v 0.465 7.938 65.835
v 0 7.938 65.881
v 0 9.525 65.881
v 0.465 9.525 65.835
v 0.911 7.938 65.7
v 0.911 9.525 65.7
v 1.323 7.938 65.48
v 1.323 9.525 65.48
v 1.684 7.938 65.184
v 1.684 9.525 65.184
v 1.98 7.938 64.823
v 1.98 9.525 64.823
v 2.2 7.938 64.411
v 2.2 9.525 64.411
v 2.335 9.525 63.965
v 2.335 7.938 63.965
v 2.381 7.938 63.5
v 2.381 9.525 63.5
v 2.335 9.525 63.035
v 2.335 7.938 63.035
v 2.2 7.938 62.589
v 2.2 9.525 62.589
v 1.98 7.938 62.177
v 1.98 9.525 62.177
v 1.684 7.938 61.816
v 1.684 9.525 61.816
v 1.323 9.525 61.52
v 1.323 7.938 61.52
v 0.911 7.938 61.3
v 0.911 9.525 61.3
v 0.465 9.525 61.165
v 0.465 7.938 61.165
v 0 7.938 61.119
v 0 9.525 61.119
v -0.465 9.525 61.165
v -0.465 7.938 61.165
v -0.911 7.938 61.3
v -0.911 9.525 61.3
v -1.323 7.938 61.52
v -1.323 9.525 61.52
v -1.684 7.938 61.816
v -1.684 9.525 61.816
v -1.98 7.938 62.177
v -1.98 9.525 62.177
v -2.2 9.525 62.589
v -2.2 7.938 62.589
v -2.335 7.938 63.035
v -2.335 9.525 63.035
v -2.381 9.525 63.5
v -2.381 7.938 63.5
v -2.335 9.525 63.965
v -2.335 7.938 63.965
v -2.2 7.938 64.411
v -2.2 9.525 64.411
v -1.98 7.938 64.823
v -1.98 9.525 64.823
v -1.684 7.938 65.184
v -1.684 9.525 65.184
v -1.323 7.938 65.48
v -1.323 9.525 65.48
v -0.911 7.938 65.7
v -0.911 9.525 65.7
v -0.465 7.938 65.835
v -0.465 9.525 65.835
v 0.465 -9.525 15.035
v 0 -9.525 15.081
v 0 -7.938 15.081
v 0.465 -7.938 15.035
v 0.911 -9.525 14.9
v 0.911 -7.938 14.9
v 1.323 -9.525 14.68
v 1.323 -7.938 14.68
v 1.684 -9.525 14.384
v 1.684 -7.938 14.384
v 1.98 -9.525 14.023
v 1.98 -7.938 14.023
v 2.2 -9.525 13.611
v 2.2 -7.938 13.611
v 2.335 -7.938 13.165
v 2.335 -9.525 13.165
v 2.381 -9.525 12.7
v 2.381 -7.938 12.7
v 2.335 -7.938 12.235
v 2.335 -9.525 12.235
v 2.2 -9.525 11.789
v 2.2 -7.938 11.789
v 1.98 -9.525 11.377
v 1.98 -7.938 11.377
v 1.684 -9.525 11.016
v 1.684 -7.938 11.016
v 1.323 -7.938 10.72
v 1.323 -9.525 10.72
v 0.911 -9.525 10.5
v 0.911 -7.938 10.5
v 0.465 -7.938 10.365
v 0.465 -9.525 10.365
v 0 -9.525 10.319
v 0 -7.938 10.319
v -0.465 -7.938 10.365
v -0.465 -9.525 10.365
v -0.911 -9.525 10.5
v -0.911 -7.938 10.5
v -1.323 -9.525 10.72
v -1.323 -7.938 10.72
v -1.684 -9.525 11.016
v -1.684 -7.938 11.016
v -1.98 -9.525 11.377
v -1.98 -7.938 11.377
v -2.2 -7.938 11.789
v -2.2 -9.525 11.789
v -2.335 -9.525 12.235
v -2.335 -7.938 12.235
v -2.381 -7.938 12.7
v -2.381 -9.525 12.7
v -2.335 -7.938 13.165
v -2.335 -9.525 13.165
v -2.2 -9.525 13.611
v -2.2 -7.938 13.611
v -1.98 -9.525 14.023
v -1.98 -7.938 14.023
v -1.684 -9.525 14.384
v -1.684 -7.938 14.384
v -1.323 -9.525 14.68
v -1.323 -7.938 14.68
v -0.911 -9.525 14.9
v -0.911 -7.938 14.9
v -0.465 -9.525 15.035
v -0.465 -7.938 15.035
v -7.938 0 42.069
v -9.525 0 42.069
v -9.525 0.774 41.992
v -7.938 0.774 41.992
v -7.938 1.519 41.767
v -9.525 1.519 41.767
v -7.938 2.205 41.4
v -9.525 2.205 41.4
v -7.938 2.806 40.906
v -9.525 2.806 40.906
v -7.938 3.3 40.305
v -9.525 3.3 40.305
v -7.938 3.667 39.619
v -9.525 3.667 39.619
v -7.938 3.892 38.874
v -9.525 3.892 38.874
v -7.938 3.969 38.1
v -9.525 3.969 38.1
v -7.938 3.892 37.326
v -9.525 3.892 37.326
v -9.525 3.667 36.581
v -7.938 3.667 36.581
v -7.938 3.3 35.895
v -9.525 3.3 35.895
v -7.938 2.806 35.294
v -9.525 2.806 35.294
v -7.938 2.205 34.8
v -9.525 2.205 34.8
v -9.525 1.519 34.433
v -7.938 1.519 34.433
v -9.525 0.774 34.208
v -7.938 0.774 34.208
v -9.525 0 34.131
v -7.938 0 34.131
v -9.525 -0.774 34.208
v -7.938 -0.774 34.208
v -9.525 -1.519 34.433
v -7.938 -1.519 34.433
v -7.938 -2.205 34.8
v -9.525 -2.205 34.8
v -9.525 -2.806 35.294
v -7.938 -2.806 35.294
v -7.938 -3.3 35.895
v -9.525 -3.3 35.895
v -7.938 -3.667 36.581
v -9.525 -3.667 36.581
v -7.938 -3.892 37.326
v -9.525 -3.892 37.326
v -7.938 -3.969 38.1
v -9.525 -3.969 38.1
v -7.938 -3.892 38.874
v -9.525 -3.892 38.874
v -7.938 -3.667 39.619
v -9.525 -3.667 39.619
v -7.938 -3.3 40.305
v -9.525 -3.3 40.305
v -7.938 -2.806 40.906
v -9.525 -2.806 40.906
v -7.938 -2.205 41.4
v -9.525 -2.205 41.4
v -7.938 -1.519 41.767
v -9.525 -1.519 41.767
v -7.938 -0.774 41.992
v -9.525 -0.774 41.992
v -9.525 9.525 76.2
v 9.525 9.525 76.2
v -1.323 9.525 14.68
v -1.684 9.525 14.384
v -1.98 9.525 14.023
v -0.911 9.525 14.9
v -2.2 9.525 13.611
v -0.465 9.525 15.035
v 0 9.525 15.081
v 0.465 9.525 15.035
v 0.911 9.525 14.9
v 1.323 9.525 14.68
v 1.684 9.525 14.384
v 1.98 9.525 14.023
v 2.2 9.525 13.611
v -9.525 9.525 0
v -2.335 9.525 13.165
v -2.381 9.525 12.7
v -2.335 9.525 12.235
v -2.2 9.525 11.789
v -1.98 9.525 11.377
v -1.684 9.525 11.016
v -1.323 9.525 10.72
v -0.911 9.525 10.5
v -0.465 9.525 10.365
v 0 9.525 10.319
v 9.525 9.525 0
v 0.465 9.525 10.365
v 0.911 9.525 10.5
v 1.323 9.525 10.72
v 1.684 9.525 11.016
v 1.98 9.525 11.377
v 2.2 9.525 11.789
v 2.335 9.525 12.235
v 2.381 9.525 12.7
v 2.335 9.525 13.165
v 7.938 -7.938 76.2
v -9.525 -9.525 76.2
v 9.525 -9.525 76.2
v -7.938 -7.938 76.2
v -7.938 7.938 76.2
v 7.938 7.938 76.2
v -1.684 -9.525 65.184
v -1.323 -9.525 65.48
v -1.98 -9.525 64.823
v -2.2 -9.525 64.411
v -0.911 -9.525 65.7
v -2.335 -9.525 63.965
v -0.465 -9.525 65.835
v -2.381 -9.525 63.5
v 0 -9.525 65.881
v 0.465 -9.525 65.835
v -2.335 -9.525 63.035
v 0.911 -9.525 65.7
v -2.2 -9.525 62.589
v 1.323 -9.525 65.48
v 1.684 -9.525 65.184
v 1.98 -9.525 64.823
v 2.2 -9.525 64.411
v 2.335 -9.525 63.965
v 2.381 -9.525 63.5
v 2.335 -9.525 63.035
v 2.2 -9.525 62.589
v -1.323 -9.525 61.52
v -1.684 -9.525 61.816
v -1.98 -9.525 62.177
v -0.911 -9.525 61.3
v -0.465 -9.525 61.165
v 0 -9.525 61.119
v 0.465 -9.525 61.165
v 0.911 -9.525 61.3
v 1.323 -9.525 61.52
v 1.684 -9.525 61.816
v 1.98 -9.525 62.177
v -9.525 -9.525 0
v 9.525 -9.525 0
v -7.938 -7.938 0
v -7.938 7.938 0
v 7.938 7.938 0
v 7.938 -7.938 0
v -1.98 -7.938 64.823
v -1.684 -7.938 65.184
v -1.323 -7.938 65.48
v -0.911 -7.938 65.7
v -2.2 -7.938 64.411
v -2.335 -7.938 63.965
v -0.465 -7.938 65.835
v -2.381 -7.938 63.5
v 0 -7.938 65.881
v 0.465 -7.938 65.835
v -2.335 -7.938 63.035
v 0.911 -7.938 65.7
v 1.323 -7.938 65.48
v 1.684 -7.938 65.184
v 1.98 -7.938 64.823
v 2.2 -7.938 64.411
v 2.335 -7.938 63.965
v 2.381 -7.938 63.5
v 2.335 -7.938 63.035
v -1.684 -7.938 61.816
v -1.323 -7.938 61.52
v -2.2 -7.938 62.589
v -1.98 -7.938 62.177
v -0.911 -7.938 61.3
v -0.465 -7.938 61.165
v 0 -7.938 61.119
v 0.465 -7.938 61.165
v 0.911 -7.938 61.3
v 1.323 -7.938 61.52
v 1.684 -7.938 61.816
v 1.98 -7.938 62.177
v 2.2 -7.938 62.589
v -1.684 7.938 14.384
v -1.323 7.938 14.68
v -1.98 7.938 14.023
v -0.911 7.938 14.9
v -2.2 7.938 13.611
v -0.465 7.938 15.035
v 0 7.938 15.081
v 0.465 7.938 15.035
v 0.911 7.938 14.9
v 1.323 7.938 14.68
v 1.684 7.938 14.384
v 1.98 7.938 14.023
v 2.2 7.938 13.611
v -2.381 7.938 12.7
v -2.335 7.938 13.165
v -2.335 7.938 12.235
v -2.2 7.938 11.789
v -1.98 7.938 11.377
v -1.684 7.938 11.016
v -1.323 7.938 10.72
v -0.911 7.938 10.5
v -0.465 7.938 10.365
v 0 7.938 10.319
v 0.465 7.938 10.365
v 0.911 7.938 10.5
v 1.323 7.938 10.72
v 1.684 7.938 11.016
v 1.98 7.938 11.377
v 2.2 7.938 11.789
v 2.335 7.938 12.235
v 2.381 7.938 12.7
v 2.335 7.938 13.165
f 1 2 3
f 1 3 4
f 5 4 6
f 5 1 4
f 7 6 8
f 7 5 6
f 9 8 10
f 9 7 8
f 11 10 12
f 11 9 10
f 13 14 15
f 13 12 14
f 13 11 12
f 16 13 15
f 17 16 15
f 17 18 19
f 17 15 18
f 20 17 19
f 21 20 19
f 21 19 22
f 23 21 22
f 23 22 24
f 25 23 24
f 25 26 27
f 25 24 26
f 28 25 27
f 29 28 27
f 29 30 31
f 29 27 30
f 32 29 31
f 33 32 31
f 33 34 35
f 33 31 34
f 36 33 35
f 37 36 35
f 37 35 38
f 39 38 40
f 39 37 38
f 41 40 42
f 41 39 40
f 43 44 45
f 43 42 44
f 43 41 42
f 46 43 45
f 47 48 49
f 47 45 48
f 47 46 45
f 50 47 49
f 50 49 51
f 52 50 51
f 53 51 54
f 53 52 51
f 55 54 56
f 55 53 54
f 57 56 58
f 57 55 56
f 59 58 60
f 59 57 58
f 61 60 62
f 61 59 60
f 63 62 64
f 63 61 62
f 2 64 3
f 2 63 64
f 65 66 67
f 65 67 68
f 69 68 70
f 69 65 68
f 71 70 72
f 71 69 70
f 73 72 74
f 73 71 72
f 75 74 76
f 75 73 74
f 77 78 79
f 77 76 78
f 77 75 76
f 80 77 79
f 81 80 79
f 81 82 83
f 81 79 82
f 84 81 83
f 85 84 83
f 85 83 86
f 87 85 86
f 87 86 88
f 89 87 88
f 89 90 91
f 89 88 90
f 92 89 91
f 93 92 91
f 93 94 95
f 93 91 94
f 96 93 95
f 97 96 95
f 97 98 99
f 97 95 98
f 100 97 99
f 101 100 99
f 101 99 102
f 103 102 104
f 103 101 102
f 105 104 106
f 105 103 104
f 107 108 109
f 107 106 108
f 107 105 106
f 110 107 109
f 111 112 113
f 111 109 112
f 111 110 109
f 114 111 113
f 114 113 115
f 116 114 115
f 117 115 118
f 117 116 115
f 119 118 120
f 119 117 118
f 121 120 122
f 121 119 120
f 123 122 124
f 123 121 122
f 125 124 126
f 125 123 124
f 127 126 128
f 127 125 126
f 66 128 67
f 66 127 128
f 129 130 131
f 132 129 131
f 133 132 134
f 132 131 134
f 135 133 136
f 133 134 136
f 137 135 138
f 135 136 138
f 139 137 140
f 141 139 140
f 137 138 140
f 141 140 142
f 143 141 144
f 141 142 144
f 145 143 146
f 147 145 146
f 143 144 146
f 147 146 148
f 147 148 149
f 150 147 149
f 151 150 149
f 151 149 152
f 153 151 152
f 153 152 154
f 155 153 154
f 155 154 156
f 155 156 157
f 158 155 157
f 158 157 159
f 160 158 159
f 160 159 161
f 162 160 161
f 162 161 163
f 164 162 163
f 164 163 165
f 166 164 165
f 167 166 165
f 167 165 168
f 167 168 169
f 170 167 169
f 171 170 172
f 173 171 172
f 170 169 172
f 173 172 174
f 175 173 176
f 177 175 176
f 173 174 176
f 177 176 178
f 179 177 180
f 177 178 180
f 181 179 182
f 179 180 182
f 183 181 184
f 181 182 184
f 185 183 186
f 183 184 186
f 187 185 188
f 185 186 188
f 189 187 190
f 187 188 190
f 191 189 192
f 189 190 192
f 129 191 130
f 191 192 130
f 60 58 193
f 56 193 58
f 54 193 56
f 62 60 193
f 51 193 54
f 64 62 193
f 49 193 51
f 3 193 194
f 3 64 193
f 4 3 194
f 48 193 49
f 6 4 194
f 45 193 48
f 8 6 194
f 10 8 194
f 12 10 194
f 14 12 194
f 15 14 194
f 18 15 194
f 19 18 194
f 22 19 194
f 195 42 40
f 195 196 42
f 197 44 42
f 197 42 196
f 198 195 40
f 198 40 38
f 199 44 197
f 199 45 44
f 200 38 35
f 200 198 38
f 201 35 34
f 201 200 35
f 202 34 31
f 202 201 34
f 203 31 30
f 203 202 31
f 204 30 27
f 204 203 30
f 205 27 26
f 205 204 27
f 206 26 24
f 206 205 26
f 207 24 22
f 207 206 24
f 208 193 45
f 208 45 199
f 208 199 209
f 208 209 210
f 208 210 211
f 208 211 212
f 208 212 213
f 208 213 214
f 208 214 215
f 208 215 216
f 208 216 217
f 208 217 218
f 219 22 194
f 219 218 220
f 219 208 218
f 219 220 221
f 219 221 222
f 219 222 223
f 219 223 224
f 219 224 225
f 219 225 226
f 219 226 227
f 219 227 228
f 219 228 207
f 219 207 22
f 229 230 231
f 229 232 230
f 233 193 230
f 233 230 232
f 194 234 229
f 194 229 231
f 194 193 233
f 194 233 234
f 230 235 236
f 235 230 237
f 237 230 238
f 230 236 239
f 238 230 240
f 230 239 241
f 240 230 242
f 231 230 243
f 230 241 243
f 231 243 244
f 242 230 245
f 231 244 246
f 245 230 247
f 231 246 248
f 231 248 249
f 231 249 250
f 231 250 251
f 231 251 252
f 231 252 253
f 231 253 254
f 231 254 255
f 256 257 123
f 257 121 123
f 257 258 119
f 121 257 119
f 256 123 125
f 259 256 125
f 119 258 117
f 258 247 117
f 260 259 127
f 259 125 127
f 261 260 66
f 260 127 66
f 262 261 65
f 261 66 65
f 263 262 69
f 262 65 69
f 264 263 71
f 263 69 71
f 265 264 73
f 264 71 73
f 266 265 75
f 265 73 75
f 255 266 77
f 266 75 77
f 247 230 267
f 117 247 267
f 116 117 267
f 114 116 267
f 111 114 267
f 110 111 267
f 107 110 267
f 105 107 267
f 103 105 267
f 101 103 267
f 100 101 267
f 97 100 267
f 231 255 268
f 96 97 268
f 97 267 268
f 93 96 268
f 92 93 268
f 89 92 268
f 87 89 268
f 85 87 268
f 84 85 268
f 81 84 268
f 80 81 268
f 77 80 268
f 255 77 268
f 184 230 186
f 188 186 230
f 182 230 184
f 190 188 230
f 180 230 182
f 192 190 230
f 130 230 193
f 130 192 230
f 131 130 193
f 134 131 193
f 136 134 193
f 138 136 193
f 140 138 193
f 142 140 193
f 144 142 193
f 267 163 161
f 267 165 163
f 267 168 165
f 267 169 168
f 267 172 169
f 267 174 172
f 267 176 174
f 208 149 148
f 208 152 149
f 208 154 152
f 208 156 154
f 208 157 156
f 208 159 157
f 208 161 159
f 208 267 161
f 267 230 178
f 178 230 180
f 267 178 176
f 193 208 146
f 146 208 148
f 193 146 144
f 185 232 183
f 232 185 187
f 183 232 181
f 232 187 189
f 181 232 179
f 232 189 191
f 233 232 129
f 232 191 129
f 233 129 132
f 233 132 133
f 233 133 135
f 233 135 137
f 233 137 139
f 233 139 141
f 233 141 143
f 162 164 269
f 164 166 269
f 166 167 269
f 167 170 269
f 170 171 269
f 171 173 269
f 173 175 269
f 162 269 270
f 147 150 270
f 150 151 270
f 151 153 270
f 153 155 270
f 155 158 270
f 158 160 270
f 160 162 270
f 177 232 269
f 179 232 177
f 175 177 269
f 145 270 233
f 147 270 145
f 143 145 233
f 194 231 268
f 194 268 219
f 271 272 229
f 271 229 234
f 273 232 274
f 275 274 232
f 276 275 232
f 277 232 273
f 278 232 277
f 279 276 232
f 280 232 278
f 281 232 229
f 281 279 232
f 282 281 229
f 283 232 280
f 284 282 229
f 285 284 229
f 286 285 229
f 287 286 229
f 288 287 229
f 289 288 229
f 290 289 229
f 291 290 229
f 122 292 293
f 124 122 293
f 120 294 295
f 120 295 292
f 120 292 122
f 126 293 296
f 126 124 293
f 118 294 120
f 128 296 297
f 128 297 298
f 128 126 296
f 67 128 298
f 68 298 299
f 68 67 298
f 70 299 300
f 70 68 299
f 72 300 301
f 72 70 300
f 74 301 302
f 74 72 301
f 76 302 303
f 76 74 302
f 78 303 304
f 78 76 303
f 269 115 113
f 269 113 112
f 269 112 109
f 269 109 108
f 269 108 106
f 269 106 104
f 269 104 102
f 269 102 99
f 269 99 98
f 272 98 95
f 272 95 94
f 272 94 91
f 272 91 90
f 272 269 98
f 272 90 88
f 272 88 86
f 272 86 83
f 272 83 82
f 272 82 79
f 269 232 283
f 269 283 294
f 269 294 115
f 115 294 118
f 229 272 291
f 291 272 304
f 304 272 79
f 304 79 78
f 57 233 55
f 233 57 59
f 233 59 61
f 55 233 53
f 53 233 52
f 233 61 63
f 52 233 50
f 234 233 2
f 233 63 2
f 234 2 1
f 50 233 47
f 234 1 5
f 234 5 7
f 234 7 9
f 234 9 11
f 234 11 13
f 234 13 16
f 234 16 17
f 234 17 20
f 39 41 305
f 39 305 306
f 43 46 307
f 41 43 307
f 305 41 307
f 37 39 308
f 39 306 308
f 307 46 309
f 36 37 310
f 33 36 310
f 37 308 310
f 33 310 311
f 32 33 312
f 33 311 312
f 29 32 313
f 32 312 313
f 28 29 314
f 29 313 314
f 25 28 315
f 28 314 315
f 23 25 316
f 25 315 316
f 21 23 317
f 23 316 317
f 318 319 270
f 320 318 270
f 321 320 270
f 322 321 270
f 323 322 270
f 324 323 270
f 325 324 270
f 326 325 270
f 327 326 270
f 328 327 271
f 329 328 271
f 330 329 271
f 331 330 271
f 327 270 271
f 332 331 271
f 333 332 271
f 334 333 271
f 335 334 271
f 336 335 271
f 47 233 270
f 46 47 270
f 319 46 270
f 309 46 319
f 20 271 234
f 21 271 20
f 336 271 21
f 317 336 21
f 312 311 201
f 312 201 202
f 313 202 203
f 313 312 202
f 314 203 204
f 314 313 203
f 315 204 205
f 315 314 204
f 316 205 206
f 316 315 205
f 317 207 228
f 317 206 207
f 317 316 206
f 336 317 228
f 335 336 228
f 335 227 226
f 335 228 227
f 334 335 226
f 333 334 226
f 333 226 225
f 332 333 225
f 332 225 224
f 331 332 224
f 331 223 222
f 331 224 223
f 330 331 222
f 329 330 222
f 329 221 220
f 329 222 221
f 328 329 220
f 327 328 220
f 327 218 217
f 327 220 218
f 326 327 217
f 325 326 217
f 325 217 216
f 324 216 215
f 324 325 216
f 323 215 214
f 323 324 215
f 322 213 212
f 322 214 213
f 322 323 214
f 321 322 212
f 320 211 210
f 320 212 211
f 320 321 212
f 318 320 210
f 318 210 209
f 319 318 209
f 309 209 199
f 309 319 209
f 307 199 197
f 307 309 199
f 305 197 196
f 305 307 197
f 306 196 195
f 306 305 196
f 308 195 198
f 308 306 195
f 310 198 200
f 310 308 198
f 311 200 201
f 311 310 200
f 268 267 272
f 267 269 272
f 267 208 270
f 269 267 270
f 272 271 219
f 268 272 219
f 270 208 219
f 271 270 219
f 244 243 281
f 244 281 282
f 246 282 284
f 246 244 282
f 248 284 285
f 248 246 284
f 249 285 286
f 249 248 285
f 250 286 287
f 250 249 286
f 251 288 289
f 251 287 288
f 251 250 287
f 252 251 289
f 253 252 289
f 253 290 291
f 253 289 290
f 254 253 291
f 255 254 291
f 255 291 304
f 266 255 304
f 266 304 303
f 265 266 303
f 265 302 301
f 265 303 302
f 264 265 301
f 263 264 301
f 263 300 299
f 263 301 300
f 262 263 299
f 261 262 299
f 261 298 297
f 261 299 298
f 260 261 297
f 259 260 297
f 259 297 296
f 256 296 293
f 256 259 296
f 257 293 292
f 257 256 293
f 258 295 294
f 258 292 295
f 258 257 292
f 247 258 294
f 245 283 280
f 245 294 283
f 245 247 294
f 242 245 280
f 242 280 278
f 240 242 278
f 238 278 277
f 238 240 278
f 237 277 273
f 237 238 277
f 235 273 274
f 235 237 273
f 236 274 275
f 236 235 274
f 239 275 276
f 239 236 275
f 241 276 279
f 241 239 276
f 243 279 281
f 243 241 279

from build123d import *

# Parameters (mm, degrees)
SKETCH1_W               = 19.05
SKETCH1_H               = 19.05
SKETCH1_W_2             = 15.875
SKETCH1_H_2             = 15.875
BOSS_EXTRUDE1_DEPTH     = 76.2
CUT_EXTRUDE1_DEPTH      = 78.381465804
CUT_EXTRUDE1_DEPTH_BACK = 78.381465804
SKETCH2_R               = 2.38125
CUT_EXTRUDE2_REACH      = 81.121
SKETCH3_R               = 3.96875


with BuildPart() as part:
    # Sketch1 → Boss-Extrude1 (new body)
    with BuildSketch(Plane.XY):
        Rectangle(SKETCH1_W, SKETCH1_H)
        Rectangle(SKETCH1_W_2, SKETCH1_H_2, mode=Mode.SUBTRACT)
    extrude(amount=BOSS_EXTRUDE1_DEPTH)

    # Sketch2 → Cut-Extrude1 (cut, two sides: drawn at the far end of the back side and taken through both)
    with BuildSketch(Plane(origin=(0, 0, 0), x_dir=(1, 0, 0), z_dir=(0, 1, 0)).offset(-CUT_EXTRUDE1_DEPTH_BACK)):
        with Locations(Location((0, -12.7, 0), (0, 0, 270))):
            Circle(SKETCH2_R)
        with Locations(Location((0, -63.5, 0), (0, 0, 270))):
            Circle(SKETCH2_R)
    extrude(amount=CUT_EXTRUDE1_DEPTH + CUT_EXTRUDE1_DEPTH_BACK, mode=Mode.SUBTRACT)

    # Sketch3 → Cut-Extrude2 (cut, up to next)
    with BuildSketch(Plane.ZY.offset(9.525), mode=Mode.PRIVATE) as cut_extrude2_sk1:
        with Locations((38.1, 0)):
            Circle(SKETCH3_R)
    cut_extrude2_tool1 = extrude(cut_extrude2_sk1.sketch, amount=-CUT_EXTRUDE2_REACH, mode=Mode.PRIVATE) & part.part
    add(cut_extrude2_tool1.solids().sort_by_distance((-9.525, 0, 38.1))[0], mode=Mode.SUBTRACT)


solid = part.part
